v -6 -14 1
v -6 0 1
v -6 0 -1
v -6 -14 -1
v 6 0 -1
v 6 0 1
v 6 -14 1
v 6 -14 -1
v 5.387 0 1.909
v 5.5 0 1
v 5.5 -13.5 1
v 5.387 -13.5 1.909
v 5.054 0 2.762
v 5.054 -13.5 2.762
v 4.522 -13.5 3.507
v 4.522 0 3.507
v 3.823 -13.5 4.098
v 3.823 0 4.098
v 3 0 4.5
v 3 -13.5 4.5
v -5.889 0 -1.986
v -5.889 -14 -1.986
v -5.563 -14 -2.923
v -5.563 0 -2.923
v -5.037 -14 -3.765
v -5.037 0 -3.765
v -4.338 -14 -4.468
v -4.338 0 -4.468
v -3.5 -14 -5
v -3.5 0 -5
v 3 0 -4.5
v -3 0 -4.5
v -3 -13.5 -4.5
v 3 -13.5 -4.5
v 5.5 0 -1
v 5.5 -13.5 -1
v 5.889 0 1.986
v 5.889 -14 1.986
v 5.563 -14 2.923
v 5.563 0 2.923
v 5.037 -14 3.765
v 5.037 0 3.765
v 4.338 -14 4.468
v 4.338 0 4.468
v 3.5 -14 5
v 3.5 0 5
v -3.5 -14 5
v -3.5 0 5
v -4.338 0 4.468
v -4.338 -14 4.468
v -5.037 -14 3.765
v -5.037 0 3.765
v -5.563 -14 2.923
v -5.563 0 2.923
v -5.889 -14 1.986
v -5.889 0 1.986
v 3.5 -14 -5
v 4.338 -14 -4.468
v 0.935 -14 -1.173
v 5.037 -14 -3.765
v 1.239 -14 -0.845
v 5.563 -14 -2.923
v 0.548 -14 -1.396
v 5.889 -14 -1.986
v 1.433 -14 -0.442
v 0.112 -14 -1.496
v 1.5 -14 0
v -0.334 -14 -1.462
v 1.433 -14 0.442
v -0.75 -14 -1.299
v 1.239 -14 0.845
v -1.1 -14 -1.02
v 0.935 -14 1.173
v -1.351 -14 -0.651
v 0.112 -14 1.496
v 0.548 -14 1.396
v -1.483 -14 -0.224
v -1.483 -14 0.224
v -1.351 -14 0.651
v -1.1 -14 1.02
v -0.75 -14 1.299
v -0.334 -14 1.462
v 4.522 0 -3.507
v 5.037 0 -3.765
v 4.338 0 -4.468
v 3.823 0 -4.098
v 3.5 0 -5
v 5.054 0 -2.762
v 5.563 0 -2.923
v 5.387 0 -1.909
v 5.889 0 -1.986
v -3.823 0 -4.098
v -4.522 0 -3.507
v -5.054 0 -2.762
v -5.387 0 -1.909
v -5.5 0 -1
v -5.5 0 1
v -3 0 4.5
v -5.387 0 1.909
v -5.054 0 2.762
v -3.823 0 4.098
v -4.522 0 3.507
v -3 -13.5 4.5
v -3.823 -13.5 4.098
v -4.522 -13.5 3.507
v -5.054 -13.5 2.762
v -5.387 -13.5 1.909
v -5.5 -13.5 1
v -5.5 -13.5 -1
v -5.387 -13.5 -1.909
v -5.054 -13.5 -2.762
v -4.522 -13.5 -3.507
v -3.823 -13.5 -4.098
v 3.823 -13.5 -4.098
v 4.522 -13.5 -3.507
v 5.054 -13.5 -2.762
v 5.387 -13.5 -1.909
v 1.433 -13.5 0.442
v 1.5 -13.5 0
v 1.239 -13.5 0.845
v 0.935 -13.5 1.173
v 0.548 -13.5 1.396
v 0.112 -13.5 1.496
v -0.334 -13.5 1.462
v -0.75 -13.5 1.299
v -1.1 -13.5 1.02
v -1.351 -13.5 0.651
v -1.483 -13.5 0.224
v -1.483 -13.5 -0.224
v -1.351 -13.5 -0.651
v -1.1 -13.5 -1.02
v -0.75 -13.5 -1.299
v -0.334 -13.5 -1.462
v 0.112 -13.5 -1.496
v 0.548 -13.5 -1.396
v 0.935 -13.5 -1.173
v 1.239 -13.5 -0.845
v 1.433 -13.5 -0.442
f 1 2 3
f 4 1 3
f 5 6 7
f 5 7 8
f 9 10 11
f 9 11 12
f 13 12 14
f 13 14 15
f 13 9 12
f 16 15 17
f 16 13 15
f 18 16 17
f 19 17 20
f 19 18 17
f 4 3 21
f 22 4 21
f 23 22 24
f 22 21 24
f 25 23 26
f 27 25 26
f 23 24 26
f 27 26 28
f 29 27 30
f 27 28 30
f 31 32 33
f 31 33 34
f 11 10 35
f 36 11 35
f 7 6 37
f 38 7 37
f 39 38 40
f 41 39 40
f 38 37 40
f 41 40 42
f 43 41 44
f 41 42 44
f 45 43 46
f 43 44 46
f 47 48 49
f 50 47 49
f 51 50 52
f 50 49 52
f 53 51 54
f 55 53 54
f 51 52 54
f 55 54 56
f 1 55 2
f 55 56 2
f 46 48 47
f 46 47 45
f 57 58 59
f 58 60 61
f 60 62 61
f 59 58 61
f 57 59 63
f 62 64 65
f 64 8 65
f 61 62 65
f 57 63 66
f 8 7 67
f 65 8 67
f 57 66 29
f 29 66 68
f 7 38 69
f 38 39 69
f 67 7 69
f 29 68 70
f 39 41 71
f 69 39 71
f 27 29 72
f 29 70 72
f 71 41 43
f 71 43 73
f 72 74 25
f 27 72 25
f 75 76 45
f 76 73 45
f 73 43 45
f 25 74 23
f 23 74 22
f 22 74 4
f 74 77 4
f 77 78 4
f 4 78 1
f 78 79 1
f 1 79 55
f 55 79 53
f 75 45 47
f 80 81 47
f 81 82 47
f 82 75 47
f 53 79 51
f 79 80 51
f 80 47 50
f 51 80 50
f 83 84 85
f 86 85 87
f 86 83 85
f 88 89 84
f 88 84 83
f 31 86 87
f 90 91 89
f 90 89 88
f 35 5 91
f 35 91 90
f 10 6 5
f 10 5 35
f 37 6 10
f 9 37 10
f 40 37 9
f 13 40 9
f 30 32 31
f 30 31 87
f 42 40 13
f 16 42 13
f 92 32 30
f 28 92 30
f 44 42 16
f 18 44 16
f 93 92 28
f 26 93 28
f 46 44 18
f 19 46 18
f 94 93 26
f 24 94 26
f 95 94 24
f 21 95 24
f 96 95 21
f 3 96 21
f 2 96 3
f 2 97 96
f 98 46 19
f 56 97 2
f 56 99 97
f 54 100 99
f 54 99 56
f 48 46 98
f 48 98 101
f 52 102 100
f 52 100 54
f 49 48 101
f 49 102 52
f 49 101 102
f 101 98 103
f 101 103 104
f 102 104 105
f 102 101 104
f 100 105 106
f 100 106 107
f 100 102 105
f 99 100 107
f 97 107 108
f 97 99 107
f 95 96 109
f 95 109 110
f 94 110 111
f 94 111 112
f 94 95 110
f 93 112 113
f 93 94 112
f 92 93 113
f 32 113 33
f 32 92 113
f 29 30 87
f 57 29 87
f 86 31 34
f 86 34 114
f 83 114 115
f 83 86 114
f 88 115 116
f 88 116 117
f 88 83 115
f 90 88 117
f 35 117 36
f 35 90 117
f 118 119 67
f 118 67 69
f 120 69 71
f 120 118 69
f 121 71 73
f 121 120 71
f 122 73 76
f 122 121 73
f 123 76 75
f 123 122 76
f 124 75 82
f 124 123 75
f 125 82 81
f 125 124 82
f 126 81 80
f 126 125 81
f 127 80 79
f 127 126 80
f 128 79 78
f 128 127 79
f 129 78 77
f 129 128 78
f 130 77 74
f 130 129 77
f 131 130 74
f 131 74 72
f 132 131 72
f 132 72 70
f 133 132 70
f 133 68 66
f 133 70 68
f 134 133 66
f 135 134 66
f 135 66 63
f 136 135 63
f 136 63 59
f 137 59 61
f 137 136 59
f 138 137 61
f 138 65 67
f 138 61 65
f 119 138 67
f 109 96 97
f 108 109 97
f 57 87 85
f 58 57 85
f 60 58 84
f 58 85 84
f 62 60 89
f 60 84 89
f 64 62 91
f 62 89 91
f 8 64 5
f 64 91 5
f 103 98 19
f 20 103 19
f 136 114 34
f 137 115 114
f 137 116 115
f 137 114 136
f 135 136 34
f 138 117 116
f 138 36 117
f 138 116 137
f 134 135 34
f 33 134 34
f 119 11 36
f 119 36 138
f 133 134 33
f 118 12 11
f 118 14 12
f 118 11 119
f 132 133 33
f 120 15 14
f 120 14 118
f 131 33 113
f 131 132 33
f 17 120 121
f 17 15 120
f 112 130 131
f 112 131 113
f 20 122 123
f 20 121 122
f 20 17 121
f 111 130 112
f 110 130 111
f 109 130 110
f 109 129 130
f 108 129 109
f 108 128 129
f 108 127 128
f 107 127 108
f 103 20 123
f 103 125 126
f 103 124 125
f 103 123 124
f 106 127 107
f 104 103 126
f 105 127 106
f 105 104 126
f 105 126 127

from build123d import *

# Parameters (mm, degrees)
PAD_DEPTH       = 14
POCKET_DEPTH    = 13.5
SKETCH002_R     = 1.5
POCKET001_DEPTH = 14.001


with BuildPart() as part:
    # Sketch → Pad (new body)
    with BuildSketch(Plane.XZ):
        with BuildLine():
            Line((-3.5, 5), (3.5, 5))
            ThreePointArc((6, 1), (5.323594, 3.358497), (3.5, 5))
            Line((6, 1), (6, -1))
            ThreePointArc((3.5, -5), (5.323594, -3.358497), (6, -1))
            Line((-3.5, -5), (3.5, -5))
            ThreePointArc((-6, -1), (-5.323594, -3.358496), (-3.5, -5))
            Line((-6, 1), (-6, -1))
            ThreePointArc((-3.5, 5), (-5.323594, 3.358496), (-6, 1))
        make_face()
    extrude(amount=PAD_DEPTH)

    # Sketch001 → Pocket (cut)
    with BuildSketch(Plane.XZ):
        with BuildLine():
            Line((-3, 4.5), (3, 4.5))
            ThreePointArc((5.5, 1), (4.810812, 3.15058), (3, 4.5))
            Line((5.5, 1), (5.5, -1))
            ThreePointArc((3, -4.5), (4.810812, -3.15058), (5.5, -1))
            Line((-3, -4.5), (3, -4.5))
            ThreePointArc((-5.5, -1), (-4.810812, -3.15058), (-3, -4.5))
            Line((-5.5, -1), (-5.5, 1))
            ThreePointArc((-3, 4.5), (-4.810812, 3.15058), (-5.5, 1))
        make_face()
    extrude(amount=POCKET_DEPTH, mode=Mode.SUBTRACT)

    # Sketch002 → Pocket001 (cut, through all)
    with BuildSketch(Plane.XZ):
        Circle(SKETCH002_R)
    extrude(amount=POCKET001_DEPTH, mode=Mode.SUBTRACT)


solid = part.part
